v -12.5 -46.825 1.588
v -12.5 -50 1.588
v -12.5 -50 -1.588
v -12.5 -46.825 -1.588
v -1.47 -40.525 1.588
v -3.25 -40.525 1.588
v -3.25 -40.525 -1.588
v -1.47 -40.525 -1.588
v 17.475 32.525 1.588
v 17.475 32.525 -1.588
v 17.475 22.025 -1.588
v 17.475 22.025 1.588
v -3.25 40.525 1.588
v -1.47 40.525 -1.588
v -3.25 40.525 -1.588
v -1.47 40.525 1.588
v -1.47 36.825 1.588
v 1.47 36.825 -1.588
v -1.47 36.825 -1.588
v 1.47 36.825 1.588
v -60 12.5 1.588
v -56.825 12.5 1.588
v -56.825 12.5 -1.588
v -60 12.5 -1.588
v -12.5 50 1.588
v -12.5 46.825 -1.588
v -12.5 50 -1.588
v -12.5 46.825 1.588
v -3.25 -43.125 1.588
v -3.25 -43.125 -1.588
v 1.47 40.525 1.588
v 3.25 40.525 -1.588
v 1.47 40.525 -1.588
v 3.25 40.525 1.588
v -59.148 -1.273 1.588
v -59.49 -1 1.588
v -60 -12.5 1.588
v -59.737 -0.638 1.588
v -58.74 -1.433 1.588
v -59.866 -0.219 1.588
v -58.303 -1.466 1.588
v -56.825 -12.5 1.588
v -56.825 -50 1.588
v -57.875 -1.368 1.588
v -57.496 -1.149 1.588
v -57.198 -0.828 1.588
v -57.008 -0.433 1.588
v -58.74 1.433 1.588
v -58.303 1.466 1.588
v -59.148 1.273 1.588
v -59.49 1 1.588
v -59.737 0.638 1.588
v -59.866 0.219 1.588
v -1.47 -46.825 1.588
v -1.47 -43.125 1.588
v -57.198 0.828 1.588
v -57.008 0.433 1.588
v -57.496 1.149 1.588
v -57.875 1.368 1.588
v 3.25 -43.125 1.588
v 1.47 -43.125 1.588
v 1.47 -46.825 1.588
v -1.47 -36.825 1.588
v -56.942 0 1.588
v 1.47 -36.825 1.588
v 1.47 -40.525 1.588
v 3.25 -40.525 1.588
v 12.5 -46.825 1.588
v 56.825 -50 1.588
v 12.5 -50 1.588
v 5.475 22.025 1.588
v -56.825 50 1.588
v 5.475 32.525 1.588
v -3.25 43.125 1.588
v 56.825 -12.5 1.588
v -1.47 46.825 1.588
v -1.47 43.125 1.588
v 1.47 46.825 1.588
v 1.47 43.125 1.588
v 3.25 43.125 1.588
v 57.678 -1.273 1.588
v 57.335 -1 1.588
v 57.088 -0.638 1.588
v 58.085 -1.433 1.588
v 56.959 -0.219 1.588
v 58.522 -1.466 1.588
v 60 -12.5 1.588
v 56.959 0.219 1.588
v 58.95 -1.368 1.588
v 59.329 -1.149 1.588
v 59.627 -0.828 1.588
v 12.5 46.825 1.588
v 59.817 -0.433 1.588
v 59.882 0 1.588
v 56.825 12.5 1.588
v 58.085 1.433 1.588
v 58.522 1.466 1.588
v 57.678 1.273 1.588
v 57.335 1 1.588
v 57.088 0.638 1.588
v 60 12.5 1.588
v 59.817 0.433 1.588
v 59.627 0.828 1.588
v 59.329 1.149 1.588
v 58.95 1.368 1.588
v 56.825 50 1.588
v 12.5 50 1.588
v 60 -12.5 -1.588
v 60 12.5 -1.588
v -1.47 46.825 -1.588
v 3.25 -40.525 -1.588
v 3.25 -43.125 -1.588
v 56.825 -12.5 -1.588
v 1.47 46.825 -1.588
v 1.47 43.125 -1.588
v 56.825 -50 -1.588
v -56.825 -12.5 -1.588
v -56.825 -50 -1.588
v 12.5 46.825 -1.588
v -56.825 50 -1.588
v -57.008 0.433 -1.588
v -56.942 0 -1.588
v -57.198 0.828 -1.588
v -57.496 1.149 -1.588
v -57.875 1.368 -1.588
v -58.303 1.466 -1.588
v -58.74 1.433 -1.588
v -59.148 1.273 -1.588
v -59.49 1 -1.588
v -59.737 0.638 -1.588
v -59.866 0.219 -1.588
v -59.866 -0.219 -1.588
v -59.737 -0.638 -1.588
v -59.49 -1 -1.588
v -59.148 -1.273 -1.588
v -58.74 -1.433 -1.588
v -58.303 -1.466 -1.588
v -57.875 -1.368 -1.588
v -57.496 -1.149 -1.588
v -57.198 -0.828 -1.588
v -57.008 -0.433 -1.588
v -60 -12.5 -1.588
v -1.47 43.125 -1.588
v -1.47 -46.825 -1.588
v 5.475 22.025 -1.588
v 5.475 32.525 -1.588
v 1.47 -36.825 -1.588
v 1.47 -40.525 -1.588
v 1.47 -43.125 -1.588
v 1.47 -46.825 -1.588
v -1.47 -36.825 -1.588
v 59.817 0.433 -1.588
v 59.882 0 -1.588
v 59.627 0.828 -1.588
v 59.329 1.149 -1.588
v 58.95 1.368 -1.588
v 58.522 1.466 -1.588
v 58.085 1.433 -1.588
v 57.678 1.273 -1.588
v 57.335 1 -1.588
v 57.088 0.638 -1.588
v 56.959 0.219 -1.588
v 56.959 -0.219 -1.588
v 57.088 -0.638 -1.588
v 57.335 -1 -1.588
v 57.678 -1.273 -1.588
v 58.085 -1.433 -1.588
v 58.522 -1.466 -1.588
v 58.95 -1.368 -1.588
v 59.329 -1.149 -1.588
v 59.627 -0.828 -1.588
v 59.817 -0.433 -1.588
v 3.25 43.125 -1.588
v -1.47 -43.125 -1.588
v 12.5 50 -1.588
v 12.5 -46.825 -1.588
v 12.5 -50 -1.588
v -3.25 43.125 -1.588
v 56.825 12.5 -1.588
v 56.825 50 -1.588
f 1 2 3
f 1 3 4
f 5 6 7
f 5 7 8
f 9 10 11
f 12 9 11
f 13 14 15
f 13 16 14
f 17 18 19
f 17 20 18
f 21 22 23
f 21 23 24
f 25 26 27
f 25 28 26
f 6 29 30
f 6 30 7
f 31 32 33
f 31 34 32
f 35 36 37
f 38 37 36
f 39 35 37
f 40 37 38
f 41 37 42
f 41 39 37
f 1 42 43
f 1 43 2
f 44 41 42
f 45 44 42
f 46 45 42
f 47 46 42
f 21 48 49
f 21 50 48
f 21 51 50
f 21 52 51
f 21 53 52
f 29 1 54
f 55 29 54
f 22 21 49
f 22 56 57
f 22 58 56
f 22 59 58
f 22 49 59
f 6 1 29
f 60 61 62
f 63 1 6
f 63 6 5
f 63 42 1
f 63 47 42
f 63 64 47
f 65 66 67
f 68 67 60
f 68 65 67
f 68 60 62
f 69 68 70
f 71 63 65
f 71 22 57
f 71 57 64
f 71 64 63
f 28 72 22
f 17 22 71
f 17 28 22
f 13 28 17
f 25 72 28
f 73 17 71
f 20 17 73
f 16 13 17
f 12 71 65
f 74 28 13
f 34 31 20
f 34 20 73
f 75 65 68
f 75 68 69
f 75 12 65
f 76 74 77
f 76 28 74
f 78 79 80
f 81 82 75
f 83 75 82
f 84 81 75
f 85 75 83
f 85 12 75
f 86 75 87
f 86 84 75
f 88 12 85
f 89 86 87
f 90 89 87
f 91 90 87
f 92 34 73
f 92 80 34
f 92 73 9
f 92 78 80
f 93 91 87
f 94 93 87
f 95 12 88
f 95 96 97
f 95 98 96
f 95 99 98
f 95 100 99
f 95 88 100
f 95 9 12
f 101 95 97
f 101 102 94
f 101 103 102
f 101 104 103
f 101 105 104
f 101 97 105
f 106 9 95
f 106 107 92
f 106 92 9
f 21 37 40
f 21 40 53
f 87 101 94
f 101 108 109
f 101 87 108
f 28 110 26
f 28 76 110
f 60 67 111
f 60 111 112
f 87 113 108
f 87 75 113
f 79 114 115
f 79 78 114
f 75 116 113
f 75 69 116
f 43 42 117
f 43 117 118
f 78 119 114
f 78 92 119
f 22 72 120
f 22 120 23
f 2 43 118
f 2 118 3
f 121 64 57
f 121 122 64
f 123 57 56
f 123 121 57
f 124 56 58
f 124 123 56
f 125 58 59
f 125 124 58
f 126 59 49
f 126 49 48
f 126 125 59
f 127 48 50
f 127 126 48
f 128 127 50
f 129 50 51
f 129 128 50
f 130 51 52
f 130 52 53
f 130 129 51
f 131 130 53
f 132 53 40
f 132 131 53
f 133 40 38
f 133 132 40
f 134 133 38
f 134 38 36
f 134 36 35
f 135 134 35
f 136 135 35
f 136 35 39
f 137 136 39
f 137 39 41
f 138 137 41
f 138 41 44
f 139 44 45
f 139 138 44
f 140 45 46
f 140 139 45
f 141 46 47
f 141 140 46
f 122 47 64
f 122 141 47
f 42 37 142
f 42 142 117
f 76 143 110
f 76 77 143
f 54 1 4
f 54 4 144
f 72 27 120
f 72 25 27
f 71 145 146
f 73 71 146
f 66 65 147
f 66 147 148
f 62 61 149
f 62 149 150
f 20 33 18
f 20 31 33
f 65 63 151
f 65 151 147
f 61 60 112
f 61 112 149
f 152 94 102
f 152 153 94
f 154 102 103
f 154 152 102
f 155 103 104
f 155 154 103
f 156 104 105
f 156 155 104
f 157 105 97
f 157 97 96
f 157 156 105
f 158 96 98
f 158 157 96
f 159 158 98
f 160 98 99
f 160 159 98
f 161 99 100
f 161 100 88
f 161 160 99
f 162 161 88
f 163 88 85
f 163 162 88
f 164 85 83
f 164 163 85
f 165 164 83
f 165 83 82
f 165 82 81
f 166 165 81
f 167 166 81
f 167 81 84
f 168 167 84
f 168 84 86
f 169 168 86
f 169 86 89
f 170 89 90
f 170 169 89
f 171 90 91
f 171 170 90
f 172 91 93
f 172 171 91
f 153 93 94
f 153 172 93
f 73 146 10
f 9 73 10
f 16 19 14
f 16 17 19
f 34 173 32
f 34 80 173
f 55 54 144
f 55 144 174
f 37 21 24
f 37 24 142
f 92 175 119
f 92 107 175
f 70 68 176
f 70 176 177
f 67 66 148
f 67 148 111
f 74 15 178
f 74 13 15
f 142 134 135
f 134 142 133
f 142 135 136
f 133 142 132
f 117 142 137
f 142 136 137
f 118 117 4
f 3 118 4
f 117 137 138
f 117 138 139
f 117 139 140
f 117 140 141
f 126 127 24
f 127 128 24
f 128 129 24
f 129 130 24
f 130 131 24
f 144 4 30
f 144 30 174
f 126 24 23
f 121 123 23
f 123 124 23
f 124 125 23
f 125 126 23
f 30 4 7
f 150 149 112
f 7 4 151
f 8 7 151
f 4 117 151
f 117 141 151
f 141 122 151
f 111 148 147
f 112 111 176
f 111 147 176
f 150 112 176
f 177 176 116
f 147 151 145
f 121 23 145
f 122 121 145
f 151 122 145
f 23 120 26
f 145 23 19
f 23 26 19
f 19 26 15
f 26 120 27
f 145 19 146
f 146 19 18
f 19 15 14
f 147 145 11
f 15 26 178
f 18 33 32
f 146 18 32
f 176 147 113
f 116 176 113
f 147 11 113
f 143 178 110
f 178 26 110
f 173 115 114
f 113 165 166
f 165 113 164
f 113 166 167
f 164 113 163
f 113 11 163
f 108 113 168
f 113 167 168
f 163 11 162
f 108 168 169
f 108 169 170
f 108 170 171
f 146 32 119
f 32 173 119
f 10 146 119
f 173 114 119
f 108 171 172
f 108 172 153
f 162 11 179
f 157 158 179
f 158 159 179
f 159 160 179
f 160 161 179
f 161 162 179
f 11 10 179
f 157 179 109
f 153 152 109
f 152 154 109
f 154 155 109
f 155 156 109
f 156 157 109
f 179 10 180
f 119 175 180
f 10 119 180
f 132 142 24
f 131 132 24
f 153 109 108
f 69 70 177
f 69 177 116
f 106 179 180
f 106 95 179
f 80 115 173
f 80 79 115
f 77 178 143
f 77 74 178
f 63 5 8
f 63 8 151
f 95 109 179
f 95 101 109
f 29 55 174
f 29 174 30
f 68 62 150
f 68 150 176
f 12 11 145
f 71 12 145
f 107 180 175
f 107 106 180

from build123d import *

# Parameters (mm, degrees)
SKETCH1_R           = 1.47
BOSS_EXTRUDE1_DEPTH = 1.5875
CUT_EXTRUDE1_DEPTH  = 4.175


with BuildPart() as part:
    # Sketch1 → Boss-Extrude1 (new body, symmetric)
    with BuildSketch(Plane.XY):
        Polygon((-12.5, 50), (-56.825, 50), (-56.825, 12.5), (-60, 12.5), (-60, -12.5), (-56.825, -12.5), (-56.825, -50), (-12.5, -50), (-12.5, -46.825), (-1.47, -46.825), (-1.47, -43.125), (-3.25, -43.125), (-3.25, -40.525), (-1.47, -40.525), (-1.47, -36.825), (1.47, -36.825), (1.47, -40.525), (3.25, -40.525), (3.25, -43.125), (1.47, -43.125), (1.47, -46.825), (12.5, -46.825), (12.5, -50), (56.825, -50), (56.825, -12.5), (60, -12.5), (60, 12.5), (56.825, 12.5), (56.825, 50), (12.5, 50), (12.5, 46.825), (1.47, 46.825), (1.47, 43.125), (3.25, 43.125), (3.25, 40.525), (1.47, 40.525), (1.47, 36.825), (-1.47, 36.825), (-1.47, 40.525), (-3.25, 40.525), (-3.25, 43.125), (-1.47, 43.125), (-1.47, 46.825), (-12.5, 46.825), align=None)
        with Locations((-58.4125, 0)):
            Circle(SKETCH1_R, mode=Mode.SUBTRACT)
        with Locations((58.4125, 0)):
            Circle(SKETCH1_R, mode=Mode.SUBTRACT)
    extrude(amount=BOSS_EXTRUDE1_DEPTH, both=True)

    # Sketch2 → Cut-Extrude1 (cut, through all)
    with BuildSketch(Plane(origin=(0, 0, -1.5875), x_dir=(-1, 0, 0), z_dir=(0, 0, -1))):
        Polygon((-5.975, 32.525), (-16.975, 32.525), (-17.475, 32.525), (-17.475, 32.025), (-17.475, 22.525), (-17.475, 22.025), (-16.975, 22.025), (-5.975, 22.025), (-5.475, 22.025), (-5.475, 22.525), (-5.475, 32.025), (-5.475, 32.525), align=None)
    extrude(amount=-CUT_EXTRUDE1_DEPTH, mode=Mode.SUBTRACT)


solid = part.part
